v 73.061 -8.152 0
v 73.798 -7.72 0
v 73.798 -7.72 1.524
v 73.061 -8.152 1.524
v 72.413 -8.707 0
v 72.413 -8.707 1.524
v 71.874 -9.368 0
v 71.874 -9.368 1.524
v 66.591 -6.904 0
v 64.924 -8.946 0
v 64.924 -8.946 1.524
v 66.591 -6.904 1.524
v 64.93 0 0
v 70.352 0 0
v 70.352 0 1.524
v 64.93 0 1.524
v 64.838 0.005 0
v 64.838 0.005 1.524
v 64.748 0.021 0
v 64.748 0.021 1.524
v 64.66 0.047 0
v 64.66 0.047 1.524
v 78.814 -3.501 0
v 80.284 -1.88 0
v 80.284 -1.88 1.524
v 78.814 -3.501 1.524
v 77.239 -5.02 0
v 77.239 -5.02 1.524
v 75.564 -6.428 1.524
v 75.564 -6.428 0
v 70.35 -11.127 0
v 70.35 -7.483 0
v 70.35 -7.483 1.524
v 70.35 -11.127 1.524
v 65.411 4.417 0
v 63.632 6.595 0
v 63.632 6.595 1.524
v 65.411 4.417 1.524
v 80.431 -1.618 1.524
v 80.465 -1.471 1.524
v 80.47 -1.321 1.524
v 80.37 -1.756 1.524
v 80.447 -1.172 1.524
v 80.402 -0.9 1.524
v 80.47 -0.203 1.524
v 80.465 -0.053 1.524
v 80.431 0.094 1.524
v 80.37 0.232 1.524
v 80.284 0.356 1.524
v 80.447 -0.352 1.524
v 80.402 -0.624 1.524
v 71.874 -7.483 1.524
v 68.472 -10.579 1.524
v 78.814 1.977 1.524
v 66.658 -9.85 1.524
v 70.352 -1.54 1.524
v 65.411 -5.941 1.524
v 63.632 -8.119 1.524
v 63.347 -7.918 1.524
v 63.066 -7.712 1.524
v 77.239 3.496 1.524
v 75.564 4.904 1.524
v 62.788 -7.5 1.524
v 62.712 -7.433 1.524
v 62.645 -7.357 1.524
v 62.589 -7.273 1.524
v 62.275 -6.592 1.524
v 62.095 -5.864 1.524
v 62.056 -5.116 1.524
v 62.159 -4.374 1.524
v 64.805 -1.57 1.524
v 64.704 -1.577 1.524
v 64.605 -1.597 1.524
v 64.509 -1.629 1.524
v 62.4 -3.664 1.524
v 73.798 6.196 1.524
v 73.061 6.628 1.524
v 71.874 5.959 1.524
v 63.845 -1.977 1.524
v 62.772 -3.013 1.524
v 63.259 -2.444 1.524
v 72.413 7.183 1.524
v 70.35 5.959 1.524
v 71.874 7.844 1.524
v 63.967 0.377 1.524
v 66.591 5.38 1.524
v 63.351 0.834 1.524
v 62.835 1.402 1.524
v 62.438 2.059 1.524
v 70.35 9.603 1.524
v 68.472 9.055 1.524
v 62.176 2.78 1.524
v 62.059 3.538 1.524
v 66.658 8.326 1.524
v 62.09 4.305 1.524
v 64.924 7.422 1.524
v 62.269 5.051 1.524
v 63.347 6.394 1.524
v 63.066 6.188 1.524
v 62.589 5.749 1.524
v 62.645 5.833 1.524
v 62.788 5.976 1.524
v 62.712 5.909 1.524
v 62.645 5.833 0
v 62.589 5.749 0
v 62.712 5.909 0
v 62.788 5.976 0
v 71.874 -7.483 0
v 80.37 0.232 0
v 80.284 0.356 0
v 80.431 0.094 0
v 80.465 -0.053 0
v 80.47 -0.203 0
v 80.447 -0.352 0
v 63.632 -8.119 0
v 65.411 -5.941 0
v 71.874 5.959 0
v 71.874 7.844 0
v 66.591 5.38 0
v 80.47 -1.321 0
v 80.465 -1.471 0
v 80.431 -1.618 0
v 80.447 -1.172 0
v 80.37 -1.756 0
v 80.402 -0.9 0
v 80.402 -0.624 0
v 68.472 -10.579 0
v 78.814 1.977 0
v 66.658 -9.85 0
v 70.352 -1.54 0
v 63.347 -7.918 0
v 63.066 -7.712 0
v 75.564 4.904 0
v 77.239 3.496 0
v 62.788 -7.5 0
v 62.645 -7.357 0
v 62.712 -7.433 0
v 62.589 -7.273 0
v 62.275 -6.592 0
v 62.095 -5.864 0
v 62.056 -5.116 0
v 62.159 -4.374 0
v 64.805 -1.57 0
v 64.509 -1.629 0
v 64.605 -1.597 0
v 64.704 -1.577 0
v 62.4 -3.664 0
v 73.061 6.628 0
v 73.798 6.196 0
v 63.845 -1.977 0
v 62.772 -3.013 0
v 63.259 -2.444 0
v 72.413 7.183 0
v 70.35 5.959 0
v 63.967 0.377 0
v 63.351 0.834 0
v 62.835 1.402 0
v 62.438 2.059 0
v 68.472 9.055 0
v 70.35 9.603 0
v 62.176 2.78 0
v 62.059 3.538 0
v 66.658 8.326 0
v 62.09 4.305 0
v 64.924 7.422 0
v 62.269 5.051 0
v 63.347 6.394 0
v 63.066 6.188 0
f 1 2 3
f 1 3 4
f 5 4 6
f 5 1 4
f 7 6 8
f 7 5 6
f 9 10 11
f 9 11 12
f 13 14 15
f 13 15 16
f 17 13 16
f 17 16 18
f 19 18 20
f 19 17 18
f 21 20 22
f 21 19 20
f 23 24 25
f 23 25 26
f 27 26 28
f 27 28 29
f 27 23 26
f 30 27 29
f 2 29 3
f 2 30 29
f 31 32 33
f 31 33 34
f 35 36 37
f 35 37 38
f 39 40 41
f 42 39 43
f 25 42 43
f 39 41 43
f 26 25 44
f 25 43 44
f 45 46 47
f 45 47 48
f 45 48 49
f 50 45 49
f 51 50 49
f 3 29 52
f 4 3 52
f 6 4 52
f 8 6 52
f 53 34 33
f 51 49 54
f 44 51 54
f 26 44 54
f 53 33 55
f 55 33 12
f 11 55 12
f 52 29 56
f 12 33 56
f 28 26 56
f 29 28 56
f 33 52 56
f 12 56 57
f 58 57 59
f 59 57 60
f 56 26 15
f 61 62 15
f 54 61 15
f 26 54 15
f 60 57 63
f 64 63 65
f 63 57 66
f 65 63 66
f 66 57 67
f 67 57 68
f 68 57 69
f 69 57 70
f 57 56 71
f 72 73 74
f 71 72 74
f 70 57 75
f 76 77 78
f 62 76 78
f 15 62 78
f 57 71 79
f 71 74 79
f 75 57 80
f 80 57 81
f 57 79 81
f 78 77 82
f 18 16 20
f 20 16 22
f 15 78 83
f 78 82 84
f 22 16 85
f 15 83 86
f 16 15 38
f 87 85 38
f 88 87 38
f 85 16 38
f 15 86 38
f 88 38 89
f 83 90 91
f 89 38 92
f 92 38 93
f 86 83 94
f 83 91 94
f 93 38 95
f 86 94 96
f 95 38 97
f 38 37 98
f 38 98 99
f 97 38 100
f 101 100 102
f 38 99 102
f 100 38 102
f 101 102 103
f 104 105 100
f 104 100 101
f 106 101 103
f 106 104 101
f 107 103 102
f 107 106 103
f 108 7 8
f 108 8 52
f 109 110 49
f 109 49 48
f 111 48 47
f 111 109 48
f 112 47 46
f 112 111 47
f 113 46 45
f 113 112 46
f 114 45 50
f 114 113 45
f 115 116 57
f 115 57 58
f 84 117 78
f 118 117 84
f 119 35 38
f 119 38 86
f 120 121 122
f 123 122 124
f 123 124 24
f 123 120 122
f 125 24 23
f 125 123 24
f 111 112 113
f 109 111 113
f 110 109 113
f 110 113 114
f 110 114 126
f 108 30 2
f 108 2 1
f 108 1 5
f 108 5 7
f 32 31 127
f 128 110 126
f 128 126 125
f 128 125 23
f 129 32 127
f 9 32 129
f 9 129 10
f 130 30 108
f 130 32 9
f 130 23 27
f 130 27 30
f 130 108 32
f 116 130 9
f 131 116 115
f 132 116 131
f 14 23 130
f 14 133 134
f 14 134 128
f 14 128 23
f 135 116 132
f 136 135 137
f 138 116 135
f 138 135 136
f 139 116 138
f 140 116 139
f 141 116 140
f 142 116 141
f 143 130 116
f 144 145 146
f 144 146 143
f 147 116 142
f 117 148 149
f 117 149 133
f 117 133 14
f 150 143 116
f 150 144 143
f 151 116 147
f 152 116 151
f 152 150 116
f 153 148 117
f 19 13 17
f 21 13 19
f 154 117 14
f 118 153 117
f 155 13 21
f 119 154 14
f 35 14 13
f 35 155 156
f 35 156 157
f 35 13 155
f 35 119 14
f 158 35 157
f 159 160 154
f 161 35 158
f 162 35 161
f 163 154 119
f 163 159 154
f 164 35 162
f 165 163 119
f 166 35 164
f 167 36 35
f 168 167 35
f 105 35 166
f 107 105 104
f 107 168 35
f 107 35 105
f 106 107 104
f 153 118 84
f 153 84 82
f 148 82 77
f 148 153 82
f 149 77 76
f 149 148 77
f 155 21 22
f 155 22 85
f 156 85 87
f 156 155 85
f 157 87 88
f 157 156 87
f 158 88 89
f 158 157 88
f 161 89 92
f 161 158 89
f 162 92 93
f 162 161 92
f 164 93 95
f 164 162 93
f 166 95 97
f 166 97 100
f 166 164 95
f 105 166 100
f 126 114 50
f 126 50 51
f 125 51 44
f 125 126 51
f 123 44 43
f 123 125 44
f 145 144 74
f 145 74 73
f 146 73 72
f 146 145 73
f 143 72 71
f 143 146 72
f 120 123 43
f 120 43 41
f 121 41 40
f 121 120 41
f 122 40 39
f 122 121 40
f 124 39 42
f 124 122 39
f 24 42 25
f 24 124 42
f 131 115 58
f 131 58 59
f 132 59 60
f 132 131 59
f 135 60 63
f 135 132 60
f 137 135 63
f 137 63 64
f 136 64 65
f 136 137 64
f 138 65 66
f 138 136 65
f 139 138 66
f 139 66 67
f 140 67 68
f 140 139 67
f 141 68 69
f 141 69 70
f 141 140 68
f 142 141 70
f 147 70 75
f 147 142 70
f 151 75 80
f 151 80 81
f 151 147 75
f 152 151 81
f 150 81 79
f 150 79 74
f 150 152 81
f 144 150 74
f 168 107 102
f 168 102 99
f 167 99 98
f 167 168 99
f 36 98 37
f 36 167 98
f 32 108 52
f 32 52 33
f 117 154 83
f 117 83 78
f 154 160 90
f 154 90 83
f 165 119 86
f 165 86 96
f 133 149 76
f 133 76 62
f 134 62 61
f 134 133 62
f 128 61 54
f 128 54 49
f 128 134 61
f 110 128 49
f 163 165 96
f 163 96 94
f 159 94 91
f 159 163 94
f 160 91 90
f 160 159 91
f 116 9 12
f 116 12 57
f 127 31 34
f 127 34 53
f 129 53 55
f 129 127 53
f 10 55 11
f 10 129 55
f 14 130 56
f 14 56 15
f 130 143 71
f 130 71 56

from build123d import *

# Parameters (mm, degrees)
BOSS_EXTRUDE1_DEPTH = 1.524


with BuildPart() as part:
    # Sketch1 → Boss-Extrude1 (new body)
    with BuildSketch(Plane.XY):
        with BuildLine():
            Line((70.351759676, -1.540442282), (70.351759676, 0))
            Line((70.351759676, 0), (64.929759758, 0))
            ThreePointArc((64.929759758, 0), (64.792973258, 0.011875), (64.660279583, 0.047144684))
            ThreePointArc((64.660279583, 0.047144684), (62.28963908, 2.412826115), (62.588919113, 5.748514423))
            ThreePointArc((62.588919113, 5.748514423), (62.67763825, 5.871916038), (62.788250891, 5.976146011))
            ThreePointArc((62.788250891, 5.976146011), (63.205809067, 6.291372891), (63.63152168, 6.595497187))
            Line((63.63152168, 6.595497187), (65.410554861, 4.41654898))
            Line((65.410554861, 4.41654898), (66.591058918, 5.380388267))
            Line((66.591058918, 5.380388267), (64.92449722, 7.421582138))
            ThreePointArc((64.92449722, 7.421582138), (67.556403706, 8.712737588), (70.349637054, 9.602603653))
            Line((70.349637054, 9.602603653), (70.349637054, 5.958967549))
            Line((70.349637054, 5.958967549), (71.873637054, 5.958967549))
            Line((71.873637054, 5.958967549), (71.873637054, 7.844356511))
            ThreePointArc((71.873637054, 7.844356511), (72.72464753, 6.890883011), (73.797539642, 6.196452982))
            ThreePointArc((73.797539642, 6.196452982), (77.23855889, 3.495988283), (80.283555852, 0.355746802))
            ThreePointArc((80.283555852, 0.355746802), (80.451041219, 0.021581778), (80.447017019, -0.35218475))
            ThreePointArc((80.447017019, -0.35218475), (80.395843158, -0.762), (80.447017019, -1.17181525))
            ThreePointArc((80.447017019, -1.17181525), (80.451041219, -1.545581778), (80.283555852, -1.879746802))
            ThreePointArc((80.283555852, -1.879746802), (77.23855889, -5.019988283), (73.797539642, -7.720452982))
            ThreePointArc((73.797539642, -7.720452982), (72.72464753, -8.414883011), (71.873637054, -9.368356511))
            Line((71.873637054, -9.368356511), (71.873637054, -7.482967549))
            Line((71.873637054, -7.482967549), (70.349637054, -7.482967549))
            Line((70.349637054, -7.482967549), (70.349637054, -11.126603653))
            ThreePointArc((70.349637054, -11.126603653), (67.556403706, -10.236737588), (64.92449722, -8.945582138))
            Line((64.92449722, -8.945582138), (66.591058918, -6.904388267))
            Line((66.591058918, -6.904388267), (65.410554861, -5.94054898))
            Line((65.410554861, -5.94054898), (63.63152168, -8.119497187))
            ThreePointArc((63.63152168, -8.119497187), (63.205809068, -7.815372891), (62.788250891, -7.500146011))
            ThreePointArc((62.788250891, -7.500146011), (62.67763825, -7.395916038), (62.588919113, -7.272514424))
            ThreePointArc((62.588919113, -7.272514424), (62.262802552, -4.01311856), (64.509301597, -1.629160622))
            ThreePointArc((64.509301597, -1.629160622), (64.654260243, -1.585608721), (64.804850415, -1.570364804))
            Line((64.804850415, -1.570364804), (70.351759676, -1.540442282))
        make_face()
    extrude(amount=BOSS_EXTRUDE1_DEPTH)


solid = part.part
